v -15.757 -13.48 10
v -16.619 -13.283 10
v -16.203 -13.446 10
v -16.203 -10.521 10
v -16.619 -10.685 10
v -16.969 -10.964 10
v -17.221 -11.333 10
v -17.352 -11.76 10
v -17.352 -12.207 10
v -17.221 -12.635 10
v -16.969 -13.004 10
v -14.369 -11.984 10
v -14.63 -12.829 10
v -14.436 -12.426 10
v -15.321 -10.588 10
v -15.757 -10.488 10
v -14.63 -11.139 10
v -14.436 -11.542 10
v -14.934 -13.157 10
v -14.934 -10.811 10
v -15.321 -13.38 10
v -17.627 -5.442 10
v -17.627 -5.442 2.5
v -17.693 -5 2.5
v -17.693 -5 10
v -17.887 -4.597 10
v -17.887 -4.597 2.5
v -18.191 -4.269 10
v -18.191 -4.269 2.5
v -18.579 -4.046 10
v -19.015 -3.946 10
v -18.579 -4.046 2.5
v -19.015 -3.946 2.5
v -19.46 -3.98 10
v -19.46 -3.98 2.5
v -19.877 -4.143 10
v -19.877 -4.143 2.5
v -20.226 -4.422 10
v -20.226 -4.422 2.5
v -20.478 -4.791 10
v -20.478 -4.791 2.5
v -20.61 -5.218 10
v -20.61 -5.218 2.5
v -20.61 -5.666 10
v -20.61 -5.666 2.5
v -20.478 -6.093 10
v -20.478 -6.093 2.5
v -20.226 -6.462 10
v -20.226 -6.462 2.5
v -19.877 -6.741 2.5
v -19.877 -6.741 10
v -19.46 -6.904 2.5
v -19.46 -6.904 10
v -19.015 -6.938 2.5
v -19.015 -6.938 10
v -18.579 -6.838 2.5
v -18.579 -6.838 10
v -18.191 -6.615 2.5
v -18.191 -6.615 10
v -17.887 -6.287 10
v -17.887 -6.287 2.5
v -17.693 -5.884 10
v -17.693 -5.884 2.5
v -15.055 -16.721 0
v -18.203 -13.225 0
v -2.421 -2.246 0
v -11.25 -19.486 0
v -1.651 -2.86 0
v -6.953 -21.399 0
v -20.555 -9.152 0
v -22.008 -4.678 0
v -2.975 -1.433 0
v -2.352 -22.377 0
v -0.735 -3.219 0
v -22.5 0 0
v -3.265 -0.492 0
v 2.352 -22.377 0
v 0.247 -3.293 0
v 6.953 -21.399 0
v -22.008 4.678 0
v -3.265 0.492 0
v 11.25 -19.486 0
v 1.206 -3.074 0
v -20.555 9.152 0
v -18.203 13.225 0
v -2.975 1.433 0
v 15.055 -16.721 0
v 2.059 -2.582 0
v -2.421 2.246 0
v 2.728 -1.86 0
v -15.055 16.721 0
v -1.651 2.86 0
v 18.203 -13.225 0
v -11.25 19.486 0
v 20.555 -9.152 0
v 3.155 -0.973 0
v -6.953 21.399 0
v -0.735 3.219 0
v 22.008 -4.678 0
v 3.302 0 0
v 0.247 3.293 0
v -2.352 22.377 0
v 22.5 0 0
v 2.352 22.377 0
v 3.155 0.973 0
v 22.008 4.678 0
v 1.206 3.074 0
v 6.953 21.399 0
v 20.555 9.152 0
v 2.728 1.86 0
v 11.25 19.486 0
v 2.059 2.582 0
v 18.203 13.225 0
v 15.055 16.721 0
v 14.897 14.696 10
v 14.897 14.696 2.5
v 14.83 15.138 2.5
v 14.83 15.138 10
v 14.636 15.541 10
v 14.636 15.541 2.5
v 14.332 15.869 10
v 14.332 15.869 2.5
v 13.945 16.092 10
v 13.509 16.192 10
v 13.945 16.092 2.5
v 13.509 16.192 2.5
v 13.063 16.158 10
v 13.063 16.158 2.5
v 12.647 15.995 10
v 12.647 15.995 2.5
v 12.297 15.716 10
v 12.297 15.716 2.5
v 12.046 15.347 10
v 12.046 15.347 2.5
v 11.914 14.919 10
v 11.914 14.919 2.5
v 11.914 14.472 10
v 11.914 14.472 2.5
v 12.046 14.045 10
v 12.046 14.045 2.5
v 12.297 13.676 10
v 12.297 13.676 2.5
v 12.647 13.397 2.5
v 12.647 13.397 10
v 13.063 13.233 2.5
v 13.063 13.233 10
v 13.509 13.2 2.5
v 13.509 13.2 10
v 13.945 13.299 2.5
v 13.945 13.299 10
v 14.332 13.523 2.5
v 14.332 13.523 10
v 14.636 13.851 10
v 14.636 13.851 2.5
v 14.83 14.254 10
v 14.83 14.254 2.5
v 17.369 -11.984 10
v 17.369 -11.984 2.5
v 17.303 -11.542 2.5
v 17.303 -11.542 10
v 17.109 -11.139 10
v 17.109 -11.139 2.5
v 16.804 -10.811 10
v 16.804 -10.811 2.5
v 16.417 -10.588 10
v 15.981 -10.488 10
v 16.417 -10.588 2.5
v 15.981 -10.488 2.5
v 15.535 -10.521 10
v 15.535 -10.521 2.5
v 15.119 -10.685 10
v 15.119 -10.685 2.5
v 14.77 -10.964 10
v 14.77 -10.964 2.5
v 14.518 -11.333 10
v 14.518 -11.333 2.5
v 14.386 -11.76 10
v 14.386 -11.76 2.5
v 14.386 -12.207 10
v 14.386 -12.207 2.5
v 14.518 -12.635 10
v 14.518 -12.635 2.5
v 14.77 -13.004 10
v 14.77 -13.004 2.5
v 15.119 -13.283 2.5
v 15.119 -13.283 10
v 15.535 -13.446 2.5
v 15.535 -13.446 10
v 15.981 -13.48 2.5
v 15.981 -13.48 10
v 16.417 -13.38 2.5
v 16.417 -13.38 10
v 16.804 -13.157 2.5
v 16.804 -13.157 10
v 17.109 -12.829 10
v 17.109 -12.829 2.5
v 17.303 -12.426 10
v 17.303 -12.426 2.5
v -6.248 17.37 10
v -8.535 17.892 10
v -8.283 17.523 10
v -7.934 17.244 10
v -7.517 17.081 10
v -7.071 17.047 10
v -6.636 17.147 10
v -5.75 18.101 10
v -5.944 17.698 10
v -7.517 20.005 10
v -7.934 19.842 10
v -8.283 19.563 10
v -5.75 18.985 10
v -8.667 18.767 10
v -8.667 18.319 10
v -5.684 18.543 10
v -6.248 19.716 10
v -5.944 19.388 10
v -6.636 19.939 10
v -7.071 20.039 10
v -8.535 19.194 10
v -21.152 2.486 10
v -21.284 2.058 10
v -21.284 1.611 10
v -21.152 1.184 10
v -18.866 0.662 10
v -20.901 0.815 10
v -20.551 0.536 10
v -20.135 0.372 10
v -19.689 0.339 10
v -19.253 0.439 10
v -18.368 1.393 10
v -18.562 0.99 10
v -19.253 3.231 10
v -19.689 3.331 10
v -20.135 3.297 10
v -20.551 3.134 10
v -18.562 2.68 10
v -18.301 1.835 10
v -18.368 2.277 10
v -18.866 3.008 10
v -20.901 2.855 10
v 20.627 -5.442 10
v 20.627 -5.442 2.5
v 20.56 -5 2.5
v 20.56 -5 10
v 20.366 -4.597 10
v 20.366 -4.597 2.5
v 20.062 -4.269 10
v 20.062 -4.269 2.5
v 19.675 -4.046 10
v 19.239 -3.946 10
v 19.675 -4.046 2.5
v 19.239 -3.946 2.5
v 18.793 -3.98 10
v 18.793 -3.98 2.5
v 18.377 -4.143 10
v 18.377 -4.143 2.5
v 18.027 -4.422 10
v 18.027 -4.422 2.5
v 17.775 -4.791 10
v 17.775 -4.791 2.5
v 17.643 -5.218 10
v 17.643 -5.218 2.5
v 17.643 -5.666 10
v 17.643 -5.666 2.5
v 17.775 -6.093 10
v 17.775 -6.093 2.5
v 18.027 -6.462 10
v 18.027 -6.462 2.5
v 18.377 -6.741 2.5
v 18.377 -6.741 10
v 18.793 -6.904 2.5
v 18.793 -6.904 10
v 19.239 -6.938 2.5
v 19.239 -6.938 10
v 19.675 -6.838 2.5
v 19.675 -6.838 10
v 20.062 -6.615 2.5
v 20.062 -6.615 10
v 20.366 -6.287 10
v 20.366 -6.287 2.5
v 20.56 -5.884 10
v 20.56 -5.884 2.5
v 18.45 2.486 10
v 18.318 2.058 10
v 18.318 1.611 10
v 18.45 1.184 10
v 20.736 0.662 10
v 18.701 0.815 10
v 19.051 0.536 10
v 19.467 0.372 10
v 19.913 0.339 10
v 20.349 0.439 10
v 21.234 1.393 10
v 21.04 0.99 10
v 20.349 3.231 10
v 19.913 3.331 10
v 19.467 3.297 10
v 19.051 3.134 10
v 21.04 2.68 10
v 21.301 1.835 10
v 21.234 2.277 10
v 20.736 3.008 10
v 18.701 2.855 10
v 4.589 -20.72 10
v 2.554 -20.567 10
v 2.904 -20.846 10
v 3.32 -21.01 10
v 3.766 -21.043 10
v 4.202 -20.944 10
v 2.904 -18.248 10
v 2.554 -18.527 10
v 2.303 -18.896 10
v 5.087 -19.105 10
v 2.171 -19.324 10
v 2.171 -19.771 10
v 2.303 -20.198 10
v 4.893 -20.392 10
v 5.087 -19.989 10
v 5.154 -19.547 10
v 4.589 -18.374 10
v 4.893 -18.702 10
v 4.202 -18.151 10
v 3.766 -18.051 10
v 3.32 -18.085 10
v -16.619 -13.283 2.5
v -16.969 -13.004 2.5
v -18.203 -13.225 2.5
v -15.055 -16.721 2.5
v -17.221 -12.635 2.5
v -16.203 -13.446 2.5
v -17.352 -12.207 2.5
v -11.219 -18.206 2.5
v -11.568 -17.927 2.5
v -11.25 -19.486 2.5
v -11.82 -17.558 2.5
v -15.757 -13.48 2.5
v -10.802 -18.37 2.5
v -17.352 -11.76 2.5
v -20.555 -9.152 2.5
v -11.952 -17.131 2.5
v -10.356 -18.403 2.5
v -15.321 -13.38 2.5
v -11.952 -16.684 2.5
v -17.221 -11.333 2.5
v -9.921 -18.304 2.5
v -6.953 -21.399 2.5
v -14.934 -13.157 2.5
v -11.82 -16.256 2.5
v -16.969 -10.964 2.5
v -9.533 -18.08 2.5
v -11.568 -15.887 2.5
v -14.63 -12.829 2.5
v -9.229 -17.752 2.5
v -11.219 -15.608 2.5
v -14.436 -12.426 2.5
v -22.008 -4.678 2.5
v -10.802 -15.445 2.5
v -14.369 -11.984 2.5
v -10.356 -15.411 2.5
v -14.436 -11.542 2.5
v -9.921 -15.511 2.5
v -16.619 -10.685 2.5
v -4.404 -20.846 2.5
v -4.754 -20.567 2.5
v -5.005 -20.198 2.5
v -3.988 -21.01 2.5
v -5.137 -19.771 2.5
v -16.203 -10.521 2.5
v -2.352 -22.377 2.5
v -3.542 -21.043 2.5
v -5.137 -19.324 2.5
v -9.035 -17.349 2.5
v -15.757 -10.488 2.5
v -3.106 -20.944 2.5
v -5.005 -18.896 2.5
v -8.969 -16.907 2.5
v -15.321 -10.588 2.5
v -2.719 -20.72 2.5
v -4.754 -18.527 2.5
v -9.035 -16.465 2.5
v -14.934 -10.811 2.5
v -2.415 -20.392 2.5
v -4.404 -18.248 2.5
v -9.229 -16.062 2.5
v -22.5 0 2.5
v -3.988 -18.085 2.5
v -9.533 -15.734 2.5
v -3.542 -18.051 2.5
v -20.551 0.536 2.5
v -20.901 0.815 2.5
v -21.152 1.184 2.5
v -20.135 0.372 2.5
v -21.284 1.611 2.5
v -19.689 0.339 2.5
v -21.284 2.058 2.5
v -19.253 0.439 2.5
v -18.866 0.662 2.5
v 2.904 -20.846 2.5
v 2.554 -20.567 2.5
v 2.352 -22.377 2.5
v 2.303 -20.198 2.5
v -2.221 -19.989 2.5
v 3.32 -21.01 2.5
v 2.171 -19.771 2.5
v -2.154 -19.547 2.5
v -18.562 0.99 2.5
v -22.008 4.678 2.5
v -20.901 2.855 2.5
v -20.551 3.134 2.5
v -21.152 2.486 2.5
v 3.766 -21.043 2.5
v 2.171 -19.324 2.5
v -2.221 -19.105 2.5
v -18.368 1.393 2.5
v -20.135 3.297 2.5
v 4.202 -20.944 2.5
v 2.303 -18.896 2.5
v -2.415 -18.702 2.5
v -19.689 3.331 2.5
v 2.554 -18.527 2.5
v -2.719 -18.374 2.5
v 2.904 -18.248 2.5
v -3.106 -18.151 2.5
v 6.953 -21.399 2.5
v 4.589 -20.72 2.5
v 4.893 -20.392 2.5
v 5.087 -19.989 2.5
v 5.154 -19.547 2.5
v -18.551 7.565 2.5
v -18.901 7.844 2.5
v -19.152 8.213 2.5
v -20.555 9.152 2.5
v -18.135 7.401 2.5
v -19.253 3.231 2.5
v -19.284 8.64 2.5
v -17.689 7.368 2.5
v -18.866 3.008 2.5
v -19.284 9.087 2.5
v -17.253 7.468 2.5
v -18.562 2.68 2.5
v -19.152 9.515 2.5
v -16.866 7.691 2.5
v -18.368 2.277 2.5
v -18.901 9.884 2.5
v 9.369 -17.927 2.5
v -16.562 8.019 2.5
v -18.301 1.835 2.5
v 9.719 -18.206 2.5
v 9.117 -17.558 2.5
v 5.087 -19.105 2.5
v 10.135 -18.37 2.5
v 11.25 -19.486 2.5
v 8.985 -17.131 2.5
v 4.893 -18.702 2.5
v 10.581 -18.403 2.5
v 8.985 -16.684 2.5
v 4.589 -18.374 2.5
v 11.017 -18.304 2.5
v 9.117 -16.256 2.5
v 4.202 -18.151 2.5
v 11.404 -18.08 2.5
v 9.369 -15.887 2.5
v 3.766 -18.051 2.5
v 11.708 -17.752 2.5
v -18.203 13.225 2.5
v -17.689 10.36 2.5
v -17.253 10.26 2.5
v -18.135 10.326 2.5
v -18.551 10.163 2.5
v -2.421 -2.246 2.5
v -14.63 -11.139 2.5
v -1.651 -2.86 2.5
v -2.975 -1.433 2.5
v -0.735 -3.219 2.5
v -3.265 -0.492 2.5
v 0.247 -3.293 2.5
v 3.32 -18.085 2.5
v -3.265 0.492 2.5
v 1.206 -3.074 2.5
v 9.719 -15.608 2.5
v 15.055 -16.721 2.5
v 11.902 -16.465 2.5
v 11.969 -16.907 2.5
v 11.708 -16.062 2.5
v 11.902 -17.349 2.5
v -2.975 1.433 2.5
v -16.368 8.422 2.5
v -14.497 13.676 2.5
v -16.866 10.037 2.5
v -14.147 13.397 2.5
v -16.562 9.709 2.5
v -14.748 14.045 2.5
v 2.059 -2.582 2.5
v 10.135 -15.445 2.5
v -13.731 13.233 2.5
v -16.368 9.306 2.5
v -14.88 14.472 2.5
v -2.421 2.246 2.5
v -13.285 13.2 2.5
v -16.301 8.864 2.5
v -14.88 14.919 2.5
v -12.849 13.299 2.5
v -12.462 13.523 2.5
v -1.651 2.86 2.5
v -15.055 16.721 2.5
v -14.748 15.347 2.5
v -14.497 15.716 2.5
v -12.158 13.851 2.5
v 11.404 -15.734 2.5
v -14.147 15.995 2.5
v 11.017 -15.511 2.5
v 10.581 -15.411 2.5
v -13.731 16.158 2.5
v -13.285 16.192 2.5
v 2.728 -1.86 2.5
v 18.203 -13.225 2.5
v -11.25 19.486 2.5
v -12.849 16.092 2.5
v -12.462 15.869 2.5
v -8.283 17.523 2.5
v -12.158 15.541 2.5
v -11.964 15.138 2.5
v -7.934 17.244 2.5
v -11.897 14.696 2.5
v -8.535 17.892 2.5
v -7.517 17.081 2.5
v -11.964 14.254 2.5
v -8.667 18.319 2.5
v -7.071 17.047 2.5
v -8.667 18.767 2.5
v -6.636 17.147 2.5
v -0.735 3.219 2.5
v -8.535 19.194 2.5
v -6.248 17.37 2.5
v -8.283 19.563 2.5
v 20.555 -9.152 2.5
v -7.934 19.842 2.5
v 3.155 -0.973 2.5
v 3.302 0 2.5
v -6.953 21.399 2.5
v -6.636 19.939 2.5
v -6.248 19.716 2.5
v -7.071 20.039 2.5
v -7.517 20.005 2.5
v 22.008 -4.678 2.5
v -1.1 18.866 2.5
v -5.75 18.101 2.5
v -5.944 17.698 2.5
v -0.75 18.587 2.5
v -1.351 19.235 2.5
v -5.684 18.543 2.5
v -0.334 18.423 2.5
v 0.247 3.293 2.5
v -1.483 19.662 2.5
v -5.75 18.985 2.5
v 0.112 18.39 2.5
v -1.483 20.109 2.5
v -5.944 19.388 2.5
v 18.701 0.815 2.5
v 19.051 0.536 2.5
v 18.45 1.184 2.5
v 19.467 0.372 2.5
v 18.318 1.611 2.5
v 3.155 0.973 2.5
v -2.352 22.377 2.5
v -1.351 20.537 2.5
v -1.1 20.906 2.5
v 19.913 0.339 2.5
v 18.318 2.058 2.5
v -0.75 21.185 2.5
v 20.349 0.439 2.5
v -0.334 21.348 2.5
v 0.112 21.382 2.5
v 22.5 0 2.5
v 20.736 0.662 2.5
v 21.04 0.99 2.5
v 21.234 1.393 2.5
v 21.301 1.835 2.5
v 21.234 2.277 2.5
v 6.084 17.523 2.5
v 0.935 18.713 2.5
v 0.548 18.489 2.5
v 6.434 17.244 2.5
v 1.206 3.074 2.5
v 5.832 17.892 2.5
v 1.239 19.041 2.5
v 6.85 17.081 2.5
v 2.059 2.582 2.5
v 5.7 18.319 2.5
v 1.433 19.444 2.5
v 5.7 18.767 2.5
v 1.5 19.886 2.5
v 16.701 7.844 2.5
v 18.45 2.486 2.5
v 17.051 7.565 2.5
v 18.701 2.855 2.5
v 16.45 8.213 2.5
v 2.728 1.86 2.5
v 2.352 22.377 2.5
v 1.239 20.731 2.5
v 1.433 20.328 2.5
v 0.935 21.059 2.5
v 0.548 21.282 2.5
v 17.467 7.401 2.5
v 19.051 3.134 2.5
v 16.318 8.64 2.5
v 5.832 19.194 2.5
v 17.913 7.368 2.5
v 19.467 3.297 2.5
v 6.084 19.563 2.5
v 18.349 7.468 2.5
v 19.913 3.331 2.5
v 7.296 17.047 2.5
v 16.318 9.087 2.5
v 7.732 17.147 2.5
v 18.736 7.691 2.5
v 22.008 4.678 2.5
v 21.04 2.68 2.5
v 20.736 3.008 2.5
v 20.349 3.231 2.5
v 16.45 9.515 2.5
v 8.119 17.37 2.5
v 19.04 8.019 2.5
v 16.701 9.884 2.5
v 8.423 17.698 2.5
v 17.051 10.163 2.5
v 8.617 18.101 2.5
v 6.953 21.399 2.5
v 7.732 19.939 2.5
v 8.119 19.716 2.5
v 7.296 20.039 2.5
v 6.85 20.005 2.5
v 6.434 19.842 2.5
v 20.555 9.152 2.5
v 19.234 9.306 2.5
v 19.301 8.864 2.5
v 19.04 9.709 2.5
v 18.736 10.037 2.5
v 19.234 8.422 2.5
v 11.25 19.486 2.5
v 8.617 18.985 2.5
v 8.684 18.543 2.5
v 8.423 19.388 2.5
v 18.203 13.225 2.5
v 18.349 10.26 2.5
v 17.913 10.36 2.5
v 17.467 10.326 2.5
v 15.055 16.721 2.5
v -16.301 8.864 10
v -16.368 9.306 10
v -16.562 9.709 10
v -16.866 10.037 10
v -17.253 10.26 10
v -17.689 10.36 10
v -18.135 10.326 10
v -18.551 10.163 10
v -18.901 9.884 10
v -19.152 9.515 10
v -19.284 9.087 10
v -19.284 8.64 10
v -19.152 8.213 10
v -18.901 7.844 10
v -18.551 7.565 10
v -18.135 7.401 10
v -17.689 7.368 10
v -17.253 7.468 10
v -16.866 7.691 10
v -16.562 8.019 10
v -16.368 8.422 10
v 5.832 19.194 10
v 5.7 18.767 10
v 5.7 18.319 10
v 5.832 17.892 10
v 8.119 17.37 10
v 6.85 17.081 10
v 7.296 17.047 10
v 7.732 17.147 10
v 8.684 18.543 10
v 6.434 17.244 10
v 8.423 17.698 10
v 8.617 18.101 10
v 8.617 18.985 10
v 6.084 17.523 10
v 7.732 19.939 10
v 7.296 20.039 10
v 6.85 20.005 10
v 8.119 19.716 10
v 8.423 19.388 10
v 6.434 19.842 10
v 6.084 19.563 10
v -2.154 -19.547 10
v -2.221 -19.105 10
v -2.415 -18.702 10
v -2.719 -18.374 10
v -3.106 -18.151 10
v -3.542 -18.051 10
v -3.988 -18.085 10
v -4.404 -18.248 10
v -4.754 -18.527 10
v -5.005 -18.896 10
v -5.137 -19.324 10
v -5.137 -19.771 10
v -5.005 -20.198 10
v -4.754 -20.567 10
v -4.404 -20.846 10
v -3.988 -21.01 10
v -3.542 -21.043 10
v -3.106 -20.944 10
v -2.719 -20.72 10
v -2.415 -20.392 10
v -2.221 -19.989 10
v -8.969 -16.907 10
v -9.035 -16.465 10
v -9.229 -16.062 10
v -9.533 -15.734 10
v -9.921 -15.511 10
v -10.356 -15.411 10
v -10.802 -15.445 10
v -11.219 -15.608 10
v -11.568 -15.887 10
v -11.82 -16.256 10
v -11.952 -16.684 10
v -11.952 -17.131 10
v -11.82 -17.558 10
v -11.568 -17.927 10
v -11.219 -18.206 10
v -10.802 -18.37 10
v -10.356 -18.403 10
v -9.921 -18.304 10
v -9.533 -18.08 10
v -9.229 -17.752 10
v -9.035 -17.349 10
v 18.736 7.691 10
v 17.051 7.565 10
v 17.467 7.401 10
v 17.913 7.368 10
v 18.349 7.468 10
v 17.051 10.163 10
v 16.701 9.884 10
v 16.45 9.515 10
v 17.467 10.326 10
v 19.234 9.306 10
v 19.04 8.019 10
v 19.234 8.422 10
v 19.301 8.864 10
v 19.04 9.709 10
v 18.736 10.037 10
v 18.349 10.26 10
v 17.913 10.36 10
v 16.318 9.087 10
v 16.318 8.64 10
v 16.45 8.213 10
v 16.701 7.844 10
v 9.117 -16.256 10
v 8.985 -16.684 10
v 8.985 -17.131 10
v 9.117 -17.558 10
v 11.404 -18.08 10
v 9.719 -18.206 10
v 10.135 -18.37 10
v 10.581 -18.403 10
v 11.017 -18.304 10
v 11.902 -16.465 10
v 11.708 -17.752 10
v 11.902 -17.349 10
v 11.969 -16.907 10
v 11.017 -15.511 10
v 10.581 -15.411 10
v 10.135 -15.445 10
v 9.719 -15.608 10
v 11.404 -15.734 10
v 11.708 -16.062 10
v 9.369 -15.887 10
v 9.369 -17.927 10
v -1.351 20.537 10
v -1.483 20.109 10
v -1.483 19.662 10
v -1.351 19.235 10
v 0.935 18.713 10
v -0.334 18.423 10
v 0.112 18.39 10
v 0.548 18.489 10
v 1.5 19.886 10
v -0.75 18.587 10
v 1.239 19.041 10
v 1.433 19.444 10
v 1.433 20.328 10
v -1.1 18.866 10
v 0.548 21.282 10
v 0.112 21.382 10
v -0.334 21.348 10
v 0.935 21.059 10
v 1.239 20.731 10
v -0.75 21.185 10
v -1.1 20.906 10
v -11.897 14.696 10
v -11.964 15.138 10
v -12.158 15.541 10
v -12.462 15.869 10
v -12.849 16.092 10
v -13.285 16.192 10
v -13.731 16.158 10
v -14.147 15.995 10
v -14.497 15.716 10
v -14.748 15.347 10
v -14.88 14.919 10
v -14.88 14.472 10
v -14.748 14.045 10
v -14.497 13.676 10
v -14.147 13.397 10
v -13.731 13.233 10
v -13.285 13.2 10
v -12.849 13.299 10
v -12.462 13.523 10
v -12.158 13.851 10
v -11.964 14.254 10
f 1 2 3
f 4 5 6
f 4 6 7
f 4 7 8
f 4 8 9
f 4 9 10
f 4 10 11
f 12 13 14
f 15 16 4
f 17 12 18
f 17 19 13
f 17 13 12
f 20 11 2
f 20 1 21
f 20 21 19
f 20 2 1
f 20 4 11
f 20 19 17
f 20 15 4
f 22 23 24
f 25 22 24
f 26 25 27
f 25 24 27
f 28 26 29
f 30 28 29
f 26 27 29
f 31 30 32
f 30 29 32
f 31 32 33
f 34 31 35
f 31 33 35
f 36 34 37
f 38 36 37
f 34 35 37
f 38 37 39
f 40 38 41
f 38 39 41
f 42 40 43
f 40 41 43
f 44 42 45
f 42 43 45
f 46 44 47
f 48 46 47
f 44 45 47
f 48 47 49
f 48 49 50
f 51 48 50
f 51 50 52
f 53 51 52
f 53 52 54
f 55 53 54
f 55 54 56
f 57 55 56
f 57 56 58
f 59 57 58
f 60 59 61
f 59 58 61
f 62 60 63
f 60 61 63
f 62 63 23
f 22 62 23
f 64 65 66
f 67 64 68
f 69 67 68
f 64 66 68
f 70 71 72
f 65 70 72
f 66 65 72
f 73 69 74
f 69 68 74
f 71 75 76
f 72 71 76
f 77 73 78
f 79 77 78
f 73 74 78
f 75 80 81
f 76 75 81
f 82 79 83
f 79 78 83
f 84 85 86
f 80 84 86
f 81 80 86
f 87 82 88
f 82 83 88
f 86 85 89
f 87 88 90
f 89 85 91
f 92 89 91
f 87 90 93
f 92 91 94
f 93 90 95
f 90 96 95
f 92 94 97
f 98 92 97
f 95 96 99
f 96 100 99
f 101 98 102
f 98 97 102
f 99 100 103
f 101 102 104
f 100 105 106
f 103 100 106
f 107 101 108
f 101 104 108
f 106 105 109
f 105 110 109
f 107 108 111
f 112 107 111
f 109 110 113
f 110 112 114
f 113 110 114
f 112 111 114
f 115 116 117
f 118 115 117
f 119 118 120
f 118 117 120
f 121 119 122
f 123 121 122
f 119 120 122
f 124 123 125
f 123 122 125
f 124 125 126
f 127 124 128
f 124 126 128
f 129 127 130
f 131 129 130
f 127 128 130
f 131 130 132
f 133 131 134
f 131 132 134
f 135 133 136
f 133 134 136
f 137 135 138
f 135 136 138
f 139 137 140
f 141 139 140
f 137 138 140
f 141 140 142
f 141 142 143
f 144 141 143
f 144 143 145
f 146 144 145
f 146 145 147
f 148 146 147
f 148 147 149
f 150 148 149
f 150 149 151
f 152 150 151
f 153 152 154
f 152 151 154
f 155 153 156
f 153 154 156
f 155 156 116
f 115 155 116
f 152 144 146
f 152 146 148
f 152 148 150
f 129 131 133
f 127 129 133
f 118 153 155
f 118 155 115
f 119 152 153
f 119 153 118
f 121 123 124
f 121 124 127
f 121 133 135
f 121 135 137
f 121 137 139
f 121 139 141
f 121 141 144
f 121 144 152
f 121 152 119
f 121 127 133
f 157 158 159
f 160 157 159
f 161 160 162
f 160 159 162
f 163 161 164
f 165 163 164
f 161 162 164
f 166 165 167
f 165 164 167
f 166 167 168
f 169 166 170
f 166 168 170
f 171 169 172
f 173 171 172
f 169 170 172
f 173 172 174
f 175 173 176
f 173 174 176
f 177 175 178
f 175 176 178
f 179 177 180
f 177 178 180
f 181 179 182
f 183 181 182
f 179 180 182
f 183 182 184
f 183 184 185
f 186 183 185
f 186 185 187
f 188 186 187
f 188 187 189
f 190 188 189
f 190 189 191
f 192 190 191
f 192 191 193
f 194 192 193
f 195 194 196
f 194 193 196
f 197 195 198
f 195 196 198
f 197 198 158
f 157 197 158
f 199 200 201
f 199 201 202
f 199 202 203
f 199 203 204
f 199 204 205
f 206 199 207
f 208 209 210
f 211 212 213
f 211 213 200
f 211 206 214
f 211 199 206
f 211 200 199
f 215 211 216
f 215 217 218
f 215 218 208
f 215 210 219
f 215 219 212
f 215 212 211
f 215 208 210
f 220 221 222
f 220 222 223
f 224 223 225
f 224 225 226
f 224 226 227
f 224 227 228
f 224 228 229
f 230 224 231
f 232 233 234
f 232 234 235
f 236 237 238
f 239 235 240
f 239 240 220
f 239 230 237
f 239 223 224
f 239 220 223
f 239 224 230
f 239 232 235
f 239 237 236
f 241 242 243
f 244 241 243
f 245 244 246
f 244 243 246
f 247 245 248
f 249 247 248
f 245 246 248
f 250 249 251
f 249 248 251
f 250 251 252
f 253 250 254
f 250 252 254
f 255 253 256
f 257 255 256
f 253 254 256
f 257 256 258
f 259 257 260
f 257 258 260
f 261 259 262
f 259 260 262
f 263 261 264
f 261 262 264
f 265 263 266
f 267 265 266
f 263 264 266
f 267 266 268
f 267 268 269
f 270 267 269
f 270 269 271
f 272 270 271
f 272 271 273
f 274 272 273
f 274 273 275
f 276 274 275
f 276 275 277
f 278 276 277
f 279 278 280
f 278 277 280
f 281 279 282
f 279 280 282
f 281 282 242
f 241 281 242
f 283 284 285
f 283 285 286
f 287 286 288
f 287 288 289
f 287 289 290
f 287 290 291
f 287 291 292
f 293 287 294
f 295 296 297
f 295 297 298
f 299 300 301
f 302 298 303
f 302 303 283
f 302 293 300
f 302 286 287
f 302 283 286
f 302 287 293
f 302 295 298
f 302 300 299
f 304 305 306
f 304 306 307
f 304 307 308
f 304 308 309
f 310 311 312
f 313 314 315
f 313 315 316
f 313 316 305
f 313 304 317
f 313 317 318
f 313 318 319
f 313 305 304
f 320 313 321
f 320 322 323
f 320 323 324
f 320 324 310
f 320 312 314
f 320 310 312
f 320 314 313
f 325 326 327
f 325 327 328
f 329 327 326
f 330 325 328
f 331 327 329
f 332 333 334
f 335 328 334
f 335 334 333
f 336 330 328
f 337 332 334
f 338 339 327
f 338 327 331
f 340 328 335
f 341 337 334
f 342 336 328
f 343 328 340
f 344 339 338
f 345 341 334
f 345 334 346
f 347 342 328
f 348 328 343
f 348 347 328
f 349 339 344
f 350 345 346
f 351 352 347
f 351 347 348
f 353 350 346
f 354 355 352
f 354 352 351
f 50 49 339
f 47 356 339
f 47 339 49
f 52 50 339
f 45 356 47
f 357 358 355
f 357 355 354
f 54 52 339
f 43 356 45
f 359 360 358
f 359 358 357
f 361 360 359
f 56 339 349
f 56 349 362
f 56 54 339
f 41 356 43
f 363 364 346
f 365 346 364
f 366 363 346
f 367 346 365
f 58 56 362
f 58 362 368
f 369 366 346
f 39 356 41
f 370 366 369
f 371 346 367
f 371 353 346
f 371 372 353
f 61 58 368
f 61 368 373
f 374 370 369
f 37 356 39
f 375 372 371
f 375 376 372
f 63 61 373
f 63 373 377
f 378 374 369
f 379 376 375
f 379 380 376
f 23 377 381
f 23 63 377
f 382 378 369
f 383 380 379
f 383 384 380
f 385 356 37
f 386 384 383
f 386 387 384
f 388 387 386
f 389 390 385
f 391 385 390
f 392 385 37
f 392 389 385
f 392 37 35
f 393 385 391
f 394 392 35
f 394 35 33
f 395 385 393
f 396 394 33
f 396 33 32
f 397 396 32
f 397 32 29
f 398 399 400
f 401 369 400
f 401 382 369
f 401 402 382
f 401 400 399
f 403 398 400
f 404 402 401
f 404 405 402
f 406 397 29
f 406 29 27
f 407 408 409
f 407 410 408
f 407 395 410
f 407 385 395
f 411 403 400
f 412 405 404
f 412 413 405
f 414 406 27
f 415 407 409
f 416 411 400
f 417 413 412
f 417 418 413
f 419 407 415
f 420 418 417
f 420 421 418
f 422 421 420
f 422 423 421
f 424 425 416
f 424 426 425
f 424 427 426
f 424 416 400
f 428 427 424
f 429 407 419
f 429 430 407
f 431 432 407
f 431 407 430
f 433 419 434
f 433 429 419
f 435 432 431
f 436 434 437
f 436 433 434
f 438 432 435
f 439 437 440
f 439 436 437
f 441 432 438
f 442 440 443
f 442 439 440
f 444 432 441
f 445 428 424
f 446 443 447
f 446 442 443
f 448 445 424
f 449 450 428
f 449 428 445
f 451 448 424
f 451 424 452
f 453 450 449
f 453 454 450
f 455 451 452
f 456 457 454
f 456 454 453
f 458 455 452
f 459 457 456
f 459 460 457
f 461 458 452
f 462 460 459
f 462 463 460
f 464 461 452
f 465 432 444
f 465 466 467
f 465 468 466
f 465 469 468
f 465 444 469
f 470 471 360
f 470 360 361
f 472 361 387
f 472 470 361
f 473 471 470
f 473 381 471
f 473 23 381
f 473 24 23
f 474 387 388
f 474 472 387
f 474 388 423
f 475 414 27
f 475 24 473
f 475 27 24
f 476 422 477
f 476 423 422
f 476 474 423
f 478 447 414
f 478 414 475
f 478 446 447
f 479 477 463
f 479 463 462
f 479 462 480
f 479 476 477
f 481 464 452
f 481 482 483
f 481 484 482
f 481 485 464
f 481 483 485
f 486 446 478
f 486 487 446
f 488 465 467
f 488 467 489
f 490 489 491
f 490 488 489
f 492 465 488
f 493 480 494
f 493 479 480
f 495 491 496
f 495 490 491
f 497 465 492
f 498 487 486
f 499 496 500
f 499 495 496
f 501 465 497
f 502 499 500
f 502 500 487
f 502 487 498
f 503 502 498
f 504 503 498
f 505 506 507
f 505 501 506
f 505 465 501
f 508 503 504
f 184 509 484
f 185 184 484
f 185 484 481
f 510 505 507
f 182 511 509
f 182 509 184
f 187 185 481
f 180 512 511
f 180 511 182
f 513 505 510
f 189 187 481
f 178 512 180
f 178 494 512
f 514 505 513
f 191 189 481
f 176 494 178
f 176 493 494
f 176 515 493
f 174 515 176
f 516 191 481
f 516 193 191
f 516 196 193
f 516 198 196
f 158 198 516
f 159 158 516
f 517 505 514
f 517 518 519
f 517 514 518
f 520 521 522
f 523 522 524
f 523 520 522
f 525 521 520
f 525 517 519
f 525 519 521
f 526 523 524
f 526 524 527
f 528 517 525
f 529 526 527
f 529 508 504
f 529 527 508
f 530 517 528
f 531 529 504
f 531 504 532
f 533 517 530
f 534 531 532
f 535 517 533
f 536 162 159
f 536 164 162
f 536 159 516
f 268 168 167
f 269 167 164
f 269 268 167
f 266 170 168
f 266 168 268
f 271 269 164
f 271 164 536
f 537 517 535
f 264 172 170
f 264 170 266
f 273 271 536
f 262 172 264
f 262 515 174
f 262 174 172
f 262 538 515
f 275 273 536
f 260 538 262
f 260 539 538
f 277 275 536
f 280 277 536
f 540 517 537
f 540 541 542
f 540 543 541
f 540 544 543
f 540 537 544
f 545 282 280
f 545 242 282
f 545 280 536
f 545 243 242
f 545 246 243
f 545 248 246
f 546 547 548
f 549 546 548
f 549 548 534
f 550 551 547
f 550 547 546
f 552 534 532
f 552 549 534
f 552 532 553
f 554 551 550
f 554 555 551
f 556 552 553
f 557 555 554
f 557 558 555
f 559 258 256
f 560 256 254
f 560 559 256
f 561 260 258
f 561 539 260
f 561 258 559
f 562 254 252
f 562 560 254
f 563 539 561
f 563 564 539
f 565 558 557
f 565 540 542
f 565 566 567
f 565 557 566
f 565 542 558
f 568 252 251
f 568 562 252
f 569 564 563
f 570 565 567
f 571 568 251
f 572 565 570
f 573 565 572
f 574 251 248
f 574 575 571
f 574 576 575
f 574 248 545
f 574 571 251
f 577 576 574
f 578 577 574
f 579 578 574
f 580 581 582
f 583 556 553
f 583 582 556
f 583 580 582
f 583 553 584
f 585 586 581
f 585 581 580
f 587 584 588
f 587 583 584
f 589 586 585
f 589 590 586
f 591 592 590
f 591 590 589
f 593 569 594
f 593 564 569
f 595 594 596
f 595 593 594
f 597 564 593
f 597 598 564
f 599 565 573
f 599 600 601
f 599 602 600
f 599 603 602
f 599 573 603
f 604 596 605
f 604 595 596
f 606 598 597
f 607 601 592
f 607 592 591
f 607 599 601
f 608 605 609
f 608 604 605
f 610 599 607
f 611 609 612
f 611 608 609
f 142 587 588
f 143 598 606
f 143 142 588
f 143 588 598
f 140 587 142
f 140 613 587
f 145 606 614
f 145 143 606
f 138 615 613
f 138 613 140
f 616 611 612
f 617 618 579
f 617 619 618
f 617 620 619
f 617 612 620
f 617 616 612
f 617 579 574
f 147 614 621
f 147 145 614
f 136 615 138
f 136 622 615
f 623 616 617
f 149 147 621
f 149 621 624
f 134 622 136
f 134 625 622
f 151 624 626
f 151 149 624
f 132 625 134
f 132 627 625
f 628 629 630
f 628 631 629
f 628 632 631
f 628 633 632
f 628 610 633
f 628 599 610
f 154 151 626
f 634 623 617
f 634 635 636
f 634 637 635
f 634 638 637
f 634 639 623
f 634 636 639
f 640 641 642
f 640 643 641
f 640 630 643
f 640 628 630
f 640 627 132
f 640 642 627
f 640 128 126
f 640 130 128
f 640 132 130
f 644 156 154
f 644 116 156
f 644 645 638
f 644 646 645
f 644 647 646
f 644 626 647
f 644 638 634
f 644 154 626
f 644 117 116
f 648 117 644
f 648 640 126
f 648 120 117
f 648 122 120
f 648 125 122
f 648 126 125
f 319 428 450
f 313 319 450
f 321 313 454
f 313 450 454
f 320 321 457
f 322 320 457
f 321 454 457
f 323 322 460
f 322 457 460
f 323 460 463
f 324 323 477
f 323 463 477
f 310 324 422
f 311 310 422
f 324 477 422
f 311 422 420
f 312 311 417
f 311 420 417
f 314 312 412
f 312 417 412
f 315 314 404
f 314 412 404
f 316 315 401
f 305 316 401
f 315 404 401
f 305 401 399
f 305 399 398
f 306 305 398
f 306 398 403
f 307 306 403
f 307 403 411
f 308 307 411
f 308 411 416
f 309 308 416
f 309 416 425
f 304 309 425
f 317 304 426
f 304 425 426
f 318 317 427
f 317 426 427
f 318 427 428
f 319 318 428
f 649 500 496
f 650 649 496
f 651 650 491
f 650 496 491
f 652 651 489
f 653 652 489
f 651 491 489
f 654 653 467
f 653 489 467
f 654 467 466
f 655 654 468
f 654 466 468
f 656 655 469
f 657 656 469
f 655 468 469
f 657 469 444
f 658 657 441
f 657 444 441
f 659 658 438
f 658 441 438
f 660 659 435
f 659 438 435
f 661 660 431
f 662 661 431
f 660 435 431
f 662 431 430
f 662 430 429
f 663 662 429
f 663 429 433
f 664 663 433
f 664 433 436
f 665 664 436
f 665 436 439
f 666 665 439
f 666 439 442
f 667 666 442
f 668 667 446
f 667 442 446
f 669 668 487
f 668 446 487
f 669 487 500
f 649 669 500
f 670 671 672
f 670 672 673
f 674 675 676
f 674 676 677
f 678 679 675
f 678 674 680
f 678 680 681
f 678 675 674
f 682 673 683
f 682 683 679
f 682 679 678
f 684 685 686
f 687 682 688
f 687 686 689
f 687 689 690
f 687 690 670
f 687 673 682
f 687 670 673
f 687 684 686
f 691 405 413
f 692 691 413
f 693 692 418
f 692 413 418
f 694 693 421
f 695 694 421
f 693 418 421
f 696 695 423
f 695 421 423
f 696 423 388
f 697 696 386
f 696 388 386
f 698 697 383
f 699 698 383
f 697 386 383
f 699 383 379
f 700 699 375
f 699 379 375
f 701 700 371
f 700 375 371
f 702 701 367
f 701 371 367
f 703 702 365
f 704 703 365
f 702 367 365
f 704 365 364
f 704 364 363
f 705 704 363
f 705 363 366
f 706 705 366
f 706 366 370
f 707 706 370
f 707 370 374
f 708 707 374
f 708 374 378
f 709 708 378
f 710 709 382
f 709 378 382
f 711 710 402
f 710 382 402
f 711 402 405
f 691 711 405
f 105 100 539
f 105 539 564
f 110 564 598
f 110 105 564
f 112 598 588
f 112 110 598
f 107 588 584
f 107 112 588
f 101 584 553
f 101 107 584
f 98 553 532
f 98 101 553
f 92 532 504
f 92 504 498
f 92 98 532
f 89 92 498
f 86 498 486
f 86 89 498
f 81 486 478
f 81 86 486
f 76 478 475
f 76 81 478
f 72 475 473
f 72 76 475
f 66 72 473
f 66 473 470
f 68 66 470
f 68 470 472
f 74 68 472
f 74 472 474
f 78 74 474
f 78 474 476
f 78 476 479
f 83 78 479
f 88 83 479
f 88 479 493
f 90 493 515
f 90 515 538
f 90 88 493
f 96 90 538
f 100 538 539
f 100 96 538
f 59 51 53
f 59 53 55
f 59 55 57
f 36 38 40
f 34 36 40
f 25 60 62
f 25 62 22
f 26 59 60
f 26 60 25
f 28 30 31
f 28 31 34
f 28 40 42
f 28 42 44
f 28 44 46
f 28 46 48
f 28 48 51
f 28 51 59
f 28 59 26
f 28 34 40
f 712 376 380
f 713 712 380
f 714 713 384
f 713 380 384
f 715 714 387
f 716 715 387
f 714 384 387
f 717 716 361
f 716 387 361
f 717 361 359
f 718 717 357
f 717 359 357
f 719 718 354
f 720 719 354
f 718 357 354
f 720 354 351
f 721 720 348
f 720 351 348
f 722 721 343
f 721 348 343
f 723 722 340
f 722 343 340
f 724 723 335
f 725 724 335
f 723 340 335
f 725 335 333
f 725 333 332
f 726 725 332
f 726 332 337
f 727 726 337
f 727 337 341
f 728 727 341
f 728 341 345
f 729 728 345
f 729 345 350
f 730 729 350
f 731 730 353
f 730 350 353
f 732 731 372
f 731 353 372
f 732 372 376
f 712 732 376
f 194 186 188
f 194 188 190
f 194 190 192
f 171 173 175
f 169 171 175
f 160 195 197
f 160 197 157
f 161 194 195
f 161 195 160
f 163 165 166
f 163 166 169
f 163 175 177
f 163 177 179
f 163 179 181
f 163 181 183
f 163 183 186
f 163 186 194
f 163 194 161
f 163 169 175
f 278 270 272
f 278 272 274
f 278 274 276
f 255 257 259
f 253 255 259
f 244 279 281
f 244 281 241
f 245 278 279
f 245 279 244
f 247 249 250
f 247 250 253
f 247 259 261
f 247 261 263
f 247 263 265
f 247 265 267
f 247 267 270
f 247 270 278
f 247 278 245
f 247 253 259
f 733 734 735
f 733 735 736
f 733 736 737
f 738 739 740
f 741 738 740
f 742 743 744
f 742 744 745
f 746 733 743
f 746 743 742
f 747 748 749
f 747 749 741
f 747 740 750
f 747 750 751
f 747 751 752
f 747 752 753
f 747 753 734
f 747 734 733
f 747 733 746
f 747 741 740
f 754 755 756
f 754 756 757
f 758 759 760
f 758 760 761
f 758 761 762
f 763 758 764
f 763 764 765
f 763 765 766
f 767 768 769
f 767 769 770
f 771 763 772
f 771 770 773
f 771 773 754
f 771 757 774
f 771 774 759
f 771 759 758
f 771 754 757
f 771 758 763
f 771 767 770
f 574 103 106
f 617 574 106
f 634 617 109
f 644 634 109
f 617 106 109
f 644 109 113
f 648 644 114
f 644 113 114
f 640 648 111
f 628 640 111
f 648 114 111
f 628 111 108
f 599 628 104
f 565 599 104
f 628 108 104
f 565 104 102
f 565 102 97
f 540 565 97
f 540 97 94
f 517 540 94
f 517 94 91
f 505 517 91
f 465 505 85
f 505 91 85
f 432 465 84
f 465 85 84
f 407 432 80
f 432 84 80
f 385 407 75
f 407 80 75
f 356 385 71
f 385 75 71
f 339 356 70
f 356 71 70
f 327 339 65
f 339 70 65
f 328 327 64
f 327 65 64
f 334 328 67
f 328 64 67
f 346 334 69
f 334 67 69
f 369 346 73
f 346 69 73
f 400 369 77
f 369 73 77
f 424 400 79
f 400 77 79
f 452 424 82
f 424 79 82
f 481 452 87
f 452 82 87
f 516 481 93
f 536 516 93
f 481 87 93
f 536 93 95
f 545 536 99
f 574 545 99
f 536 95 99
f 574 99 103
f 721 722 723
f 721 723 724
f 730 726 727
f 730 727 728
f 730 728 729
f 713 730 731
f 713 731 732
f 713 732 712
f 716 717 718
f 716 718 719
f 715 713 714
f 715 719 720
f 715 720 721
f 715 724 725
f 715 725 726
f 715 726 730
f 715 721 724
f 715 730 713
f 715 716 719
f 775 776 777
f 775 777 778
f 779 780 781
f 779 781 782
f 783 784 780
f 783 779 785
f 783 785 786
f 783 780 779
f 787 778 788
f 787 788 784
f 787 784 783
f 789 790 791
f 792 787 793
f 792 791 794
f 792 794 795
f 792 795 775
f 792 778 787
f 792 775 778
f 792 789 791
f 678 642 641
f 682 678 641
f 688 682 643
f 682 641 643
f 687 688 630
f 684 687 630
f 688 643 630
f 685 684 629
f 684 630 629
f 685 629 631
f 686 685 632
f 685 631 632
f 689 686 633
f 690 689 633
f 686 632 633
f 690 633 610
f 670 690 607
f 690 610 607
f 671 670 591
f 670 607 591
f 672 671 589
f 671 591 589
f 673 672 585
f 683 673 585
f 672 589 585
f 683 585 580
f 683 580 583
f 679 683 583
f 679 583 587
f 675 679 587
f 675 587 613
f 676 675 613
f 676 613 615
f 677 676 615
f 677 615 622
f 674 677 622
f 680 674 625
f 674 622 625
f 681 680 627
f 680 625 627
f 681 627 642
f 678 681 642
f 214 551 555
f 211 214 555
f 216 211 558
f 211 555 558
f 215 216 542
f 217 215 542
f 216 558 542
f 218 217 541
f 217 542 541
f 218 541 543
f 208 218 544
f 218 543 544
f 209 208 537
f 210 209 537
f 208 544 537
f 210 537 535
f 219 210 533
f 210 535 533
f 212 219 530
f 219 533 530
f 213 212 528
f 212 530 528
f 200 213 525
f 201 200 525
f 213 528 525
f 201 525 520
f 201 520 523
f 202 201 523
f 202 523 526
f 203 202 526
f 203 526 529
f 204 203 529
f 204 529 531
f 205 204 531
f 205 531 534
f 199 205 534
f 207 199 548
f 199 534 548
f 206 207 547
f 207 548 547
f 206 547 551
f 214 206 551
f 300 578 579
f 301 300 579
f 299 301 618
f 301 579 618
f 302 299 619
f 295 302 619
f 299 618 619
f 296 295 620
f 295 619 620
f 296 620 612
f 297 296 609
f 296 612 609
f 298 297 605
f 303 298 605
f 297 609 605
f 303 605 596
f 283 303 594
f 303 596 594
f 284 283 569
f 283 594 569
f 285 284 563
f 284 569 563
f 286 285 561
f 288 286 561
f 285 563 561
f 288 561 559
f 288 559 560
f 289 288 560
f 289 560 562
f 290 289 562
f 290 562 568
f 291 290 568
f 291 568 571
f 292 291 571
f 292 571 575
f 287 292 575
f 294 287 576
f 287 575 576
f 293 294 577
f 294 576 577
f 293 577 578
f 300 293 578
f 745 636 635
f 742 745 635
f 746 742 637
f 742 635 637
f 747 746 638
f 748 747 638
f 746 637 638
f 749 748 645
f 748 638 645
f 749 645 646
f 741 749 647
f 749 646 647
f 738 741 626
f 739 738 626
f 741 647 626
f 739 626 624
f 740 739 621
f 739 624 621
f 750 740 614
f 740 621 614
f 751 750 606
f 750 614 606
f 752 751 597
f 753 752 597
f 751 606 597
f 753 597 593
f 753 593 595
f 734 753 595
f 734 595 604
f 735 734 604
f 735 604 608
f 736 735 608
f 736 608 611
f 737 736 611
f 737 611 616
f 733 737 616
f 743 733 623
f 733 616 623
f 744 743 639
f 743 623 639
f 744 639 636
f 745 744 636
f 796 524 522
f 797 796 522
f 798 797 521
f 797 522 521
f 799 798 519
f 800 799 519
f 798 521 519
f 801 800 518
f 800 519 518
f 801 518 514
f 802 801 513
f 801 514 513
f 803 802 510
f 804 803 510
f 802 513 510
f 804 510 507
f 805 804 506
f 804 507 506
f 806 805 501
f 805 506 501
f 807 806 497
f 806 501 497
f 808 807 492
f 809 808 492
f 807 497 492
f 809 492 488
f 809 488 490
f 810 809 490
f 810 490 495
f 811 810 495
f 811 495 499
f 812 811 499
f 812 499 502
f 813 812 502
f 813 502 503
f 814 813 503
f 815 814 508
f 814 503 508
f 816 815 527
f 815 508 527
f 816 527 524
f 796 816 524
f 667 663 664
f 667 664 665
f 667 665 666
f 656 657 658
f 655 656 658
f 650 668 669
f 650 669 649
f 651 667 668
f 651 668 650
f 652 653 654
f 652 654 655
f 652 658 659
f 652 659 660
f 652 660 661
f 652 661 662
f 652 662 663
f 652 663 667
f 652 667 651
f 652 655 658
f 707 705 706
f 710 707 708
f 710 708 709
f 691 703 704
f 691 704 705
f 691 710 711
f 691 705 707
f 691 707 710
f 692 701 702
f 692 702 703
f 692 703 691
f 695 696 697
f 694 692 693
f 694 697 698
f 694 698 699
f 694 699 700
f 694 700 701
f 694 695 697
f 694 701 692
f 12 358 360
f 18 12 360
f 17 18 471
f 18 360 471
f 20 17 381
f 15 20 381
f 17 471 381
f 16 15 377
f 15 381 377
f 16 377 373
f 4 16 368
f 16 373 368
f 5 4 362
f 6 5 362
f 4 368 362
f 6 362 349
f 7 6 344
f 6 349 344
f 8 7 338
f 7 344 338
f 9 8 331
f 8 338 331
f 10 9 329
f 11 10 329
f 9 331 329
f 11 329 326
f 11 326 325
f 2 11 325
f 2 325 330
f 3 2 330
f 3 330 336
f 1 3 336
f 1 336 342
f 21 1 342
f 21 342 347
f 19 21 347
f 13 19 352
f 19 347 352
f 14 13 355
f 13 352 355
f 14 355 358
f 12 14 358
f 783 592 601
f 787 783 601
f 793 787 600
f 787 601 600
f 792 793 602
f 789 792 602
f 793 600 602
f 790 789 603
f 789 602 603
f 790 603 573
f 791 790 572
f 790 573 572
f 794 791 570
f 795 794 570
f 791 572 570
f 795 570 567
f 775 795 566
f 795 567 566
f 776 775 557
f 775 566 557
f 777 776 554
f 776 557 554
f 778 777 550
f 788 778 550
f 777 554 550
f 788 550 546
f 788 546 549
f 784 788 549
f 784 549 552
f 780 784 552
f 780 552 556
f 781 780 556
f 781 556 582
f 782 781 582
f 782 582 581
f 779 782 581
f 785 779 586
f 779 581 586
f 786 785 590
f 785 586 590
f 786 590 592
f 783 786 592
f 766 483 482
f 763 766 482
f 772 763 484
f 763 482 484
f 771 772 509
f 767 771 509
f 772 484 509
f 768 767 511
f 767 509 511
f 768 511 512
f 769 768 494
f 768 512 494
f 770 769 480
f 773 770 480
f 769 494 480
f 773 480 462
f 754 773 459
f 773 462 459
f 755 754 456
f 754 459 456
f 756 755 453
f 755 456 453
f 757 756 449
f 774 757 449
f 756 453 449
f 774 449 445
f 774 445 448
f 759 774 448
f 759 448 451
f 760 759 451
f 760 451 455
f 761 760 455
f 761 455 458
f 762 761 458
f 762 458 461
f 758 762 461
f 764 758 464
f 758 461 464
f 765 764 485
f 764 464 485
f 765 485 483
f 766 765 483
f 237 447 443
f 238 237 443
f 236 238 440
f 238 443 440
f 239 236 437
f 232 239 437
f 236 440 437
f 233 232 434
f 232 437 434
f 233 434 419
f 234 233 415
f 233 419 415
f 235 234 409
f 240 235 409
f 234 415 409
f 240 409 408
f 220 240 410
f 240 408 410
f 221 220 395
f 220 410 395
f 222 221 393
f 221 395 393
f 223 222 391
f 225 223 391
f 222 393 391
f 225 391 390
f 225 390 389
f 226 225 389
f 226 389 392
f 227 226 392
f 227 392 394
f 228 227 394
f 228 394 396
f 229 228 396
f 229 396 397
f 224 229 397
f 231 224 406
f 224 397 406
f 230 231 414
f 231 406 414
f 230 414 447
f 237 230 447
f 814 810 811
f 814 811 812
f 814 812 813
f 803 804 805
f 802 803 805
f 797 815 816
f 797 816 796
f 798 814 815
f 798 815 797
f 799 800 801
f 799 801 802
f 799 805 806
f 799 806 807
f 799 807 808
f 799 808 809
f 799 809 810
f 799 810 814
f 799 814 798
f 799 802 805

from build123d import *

# Parameters (mm, degrees)
F0_R     = 22.5
F0_R_2   = 3.302
F1_DEPTH = 2.5
F2_R     = 1.5
F3_DEPTH = 7.5


with BuildPart() as f1:
    # F0 (on Top) → F1 (new body)
    with BuildSketch(Plane.XY):
        Circle(F0_R)
        Circle(F0_R_2, mode=Mode.SUBTRACT)
    extrude(amount=F1_DEPTH)

    # F2 (on face) → F3 (join)
    with BuildSketch(Plane.XY.offset(2.5)):
        with Locations((0, 19.88579)):
            Circle(F2_R)
        with Locations((-7.183576, 18.542947)):
            Circle(F2_R)
        with Locations((-13.39697, 14.695776)):
            Circle(F2_R)
        with Locations((-17.801029, 8.863859)):
            Circle(F2_R)
        with Locations((-19.800961, 1.834829)):
            Circle(F2_R)
        with Locations((-19.126663, -5.442005)):
            Circle(F2_R)
        with Locations((-15.869203, -11.983866)):
            Circle(F2_R)
        with Locations((-10.46852, -16.90724)):
            Circle(F2_R)
        with Locations((-3.654004, -19.547197)):
            Circle(F2_R)
        with Locations((3.654004, -19.547197)):
            Circle(F2_R)
        with Locations((10.46852, -16.90724)):
            Circle(F2_R)
        with Locations((15.869203, -11.983866)):
            Circle(F2_R)
        with Locations((19.126663, -5.442005)):
            Circle(F2_R)
        with Locations((19.800961, 1.834829)):
            Circle(F2_R)
        with Locations((17.801029, 8.863859)):
            Circle(F2_R)
        with Locations((13.39697, 14.695776)):
            Circle(F2_R)
        with Locations((7.183576, 18.542947)):
            Circle(F2_R)
    extrude(amount=F3_DEPTH)


solid = f1.part
